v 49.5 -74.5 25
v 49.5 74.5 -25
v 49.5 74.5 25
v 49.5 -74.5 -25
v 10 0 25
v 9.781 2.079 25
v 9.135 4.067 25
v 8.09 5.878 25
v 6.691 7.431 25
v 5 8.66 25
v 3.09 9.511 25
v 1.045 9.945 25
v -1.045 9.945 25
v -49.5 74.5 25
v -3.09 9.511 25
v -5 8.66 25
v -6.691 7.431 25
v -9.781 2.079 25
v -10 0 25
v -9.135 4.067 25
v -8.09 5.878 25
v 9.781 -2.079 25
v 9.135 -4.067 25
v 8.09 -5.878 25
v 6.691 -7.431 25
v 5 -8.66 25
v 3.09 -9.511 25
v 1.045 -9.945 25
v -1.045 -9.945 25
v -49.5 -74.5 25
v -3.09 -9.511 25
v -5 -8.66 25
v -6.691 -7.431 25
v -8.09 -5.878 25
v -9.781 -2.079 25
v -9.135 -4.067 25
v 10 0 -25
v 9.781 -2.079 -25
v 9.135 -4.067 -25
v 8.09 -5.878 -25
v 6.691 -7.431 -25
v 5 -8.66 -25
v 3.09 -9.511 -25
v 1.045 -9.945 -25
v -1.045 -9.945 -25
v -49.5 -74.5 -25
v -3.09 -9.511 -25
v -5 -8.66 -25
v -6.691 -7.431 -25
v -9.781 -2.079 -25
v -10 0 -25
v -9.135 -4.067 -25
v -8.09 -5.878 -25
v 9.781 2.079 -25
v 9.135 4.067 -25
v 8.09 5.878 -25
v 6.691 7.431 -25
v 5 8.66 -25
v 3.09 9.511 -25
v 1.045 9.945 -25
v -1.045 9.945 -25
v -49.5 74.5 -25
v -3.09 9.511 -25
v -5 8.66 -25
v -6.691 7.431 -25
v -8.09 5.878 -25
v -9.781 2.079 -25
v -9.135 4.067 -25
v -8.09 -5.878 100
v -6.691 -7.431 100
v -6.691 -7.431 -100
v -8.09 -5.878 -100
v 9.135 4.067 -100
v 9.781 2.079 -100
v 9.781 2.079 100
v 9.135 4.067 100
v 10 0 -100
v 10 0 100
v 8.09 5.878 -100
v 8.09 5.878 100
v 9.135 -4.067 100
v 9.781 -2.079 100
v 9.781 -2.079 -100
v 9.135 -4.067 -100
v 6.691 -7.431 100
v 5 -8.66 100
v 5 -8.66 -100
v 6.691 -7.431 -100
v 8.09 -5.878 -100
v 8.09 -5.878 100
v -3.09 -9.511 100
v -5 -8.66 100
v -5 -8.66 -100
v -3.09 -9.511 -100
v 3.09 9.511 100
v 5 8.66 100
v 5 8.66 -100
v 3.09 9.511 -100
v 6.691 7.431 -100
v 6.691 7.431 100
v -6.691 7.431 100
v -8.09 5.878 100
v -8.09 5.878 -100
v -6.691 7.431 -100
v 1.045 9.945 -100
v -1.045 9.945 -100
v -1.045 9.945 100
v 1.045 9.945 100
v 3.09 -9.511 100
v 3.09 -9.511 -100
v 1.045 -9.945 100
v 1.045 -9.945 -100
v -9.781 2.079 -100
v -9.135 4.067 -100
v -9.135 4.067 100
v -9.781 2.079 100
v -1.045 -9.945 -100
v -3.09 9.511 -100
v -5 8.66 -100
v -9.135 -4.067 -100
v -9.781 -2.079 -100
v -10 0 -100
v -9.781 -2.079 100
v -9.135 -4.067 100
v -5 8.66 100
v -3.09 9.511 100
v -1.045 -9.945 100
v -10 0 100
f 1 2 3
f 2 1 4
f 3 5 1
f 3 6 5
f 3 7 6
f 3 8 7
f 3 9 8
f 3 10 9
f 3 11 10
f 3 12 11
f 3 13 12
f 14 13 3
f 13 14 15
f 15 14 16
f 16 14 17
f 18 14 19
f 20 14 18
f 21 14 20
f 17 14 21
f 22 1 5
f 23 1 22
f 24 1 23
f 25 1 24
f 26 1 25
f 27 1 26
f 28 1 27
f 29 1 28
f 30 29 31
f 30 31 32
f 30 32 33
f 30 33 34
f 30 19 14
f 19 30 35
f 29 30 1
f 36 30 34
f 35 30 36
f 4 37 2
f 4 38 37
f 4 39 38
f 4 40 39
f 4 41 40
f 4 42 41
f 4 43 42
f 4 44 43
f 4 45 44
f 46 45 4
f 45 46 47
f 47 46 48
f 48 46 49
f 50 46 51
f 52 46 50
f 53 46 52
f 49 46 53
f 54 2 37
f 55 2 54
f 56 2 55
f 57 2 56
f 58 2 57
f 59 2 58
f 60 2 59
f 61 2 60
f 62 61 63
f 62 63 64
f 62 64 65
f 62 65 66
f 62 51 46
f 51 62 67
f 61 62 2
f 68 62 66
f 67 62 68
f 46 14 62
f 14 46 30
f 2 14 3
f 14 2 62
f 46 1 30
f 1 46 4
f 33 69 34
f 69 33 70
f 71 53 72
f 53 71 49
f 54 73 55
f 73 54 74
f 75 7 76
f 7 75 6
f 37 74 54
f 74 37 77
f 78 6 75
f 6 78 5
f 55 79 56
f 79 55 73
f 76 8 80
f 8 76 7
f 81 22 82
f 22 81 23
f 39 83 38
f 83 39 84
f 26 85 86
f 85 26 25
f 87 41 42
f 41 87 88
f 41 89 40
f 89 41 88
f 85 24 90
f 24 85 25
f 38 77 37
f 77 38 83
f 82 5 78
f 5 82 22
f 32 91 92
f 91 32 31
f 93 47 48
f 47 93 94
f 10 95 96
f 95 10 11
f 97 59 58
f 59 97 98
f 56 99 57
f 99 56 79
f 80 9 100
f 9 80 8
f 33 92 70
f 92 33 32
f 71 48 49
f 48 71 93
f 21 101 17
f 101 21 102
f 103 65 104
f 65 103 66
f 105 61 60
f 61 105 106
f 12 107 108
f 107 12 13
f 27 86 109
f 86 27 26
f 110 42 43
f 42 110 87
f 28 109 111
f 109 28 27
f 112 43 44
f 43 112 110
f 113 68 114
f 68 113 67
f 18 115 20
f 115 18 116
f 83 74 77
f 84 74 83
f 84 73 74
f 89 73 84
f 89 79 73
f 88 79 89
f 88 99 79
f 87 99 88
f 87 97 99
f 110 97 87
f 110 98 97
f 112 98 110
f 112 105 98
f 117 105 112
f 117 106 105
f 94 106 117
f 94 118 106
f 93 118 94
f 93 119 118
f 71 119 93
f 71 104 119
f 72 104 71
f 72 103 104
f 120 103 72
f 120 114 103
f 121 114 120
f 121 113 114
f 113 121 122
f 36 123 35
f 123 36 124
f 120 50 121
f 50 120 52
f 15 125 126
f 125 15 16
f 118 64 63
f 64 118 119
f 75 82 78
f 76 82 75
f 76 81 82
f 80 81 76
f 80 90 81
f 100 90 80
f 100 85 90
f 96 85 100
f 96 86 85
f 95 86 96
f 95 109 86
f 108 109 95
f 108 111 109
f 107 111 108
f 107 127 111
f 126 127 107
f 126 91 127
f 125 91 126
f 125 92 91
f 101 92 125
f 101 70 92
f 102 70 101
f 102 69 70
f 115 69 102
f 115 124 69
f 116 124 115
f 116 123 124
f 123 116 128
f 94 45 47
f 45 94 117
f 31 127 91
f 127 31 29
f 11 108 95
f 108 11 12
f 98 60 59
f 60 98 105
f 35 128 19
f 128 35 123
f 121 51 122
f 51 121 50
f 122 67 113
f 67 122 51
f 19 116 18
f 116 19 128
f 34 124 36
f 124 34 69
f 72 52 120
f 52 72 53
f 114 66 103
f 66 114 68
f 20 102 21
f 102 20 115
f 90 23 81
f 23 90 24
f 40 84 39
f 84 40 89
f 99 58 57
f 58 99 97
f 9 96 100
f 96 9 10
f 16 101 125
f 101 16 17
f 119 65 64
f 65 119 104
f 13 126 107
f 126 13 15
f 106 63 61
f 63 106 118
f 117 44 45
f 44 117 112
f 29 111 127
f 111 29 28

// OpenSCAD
union () {
  cube ([99, 149, 50], center=true);
  cylinder (h=200, r=10, center=true);
}
